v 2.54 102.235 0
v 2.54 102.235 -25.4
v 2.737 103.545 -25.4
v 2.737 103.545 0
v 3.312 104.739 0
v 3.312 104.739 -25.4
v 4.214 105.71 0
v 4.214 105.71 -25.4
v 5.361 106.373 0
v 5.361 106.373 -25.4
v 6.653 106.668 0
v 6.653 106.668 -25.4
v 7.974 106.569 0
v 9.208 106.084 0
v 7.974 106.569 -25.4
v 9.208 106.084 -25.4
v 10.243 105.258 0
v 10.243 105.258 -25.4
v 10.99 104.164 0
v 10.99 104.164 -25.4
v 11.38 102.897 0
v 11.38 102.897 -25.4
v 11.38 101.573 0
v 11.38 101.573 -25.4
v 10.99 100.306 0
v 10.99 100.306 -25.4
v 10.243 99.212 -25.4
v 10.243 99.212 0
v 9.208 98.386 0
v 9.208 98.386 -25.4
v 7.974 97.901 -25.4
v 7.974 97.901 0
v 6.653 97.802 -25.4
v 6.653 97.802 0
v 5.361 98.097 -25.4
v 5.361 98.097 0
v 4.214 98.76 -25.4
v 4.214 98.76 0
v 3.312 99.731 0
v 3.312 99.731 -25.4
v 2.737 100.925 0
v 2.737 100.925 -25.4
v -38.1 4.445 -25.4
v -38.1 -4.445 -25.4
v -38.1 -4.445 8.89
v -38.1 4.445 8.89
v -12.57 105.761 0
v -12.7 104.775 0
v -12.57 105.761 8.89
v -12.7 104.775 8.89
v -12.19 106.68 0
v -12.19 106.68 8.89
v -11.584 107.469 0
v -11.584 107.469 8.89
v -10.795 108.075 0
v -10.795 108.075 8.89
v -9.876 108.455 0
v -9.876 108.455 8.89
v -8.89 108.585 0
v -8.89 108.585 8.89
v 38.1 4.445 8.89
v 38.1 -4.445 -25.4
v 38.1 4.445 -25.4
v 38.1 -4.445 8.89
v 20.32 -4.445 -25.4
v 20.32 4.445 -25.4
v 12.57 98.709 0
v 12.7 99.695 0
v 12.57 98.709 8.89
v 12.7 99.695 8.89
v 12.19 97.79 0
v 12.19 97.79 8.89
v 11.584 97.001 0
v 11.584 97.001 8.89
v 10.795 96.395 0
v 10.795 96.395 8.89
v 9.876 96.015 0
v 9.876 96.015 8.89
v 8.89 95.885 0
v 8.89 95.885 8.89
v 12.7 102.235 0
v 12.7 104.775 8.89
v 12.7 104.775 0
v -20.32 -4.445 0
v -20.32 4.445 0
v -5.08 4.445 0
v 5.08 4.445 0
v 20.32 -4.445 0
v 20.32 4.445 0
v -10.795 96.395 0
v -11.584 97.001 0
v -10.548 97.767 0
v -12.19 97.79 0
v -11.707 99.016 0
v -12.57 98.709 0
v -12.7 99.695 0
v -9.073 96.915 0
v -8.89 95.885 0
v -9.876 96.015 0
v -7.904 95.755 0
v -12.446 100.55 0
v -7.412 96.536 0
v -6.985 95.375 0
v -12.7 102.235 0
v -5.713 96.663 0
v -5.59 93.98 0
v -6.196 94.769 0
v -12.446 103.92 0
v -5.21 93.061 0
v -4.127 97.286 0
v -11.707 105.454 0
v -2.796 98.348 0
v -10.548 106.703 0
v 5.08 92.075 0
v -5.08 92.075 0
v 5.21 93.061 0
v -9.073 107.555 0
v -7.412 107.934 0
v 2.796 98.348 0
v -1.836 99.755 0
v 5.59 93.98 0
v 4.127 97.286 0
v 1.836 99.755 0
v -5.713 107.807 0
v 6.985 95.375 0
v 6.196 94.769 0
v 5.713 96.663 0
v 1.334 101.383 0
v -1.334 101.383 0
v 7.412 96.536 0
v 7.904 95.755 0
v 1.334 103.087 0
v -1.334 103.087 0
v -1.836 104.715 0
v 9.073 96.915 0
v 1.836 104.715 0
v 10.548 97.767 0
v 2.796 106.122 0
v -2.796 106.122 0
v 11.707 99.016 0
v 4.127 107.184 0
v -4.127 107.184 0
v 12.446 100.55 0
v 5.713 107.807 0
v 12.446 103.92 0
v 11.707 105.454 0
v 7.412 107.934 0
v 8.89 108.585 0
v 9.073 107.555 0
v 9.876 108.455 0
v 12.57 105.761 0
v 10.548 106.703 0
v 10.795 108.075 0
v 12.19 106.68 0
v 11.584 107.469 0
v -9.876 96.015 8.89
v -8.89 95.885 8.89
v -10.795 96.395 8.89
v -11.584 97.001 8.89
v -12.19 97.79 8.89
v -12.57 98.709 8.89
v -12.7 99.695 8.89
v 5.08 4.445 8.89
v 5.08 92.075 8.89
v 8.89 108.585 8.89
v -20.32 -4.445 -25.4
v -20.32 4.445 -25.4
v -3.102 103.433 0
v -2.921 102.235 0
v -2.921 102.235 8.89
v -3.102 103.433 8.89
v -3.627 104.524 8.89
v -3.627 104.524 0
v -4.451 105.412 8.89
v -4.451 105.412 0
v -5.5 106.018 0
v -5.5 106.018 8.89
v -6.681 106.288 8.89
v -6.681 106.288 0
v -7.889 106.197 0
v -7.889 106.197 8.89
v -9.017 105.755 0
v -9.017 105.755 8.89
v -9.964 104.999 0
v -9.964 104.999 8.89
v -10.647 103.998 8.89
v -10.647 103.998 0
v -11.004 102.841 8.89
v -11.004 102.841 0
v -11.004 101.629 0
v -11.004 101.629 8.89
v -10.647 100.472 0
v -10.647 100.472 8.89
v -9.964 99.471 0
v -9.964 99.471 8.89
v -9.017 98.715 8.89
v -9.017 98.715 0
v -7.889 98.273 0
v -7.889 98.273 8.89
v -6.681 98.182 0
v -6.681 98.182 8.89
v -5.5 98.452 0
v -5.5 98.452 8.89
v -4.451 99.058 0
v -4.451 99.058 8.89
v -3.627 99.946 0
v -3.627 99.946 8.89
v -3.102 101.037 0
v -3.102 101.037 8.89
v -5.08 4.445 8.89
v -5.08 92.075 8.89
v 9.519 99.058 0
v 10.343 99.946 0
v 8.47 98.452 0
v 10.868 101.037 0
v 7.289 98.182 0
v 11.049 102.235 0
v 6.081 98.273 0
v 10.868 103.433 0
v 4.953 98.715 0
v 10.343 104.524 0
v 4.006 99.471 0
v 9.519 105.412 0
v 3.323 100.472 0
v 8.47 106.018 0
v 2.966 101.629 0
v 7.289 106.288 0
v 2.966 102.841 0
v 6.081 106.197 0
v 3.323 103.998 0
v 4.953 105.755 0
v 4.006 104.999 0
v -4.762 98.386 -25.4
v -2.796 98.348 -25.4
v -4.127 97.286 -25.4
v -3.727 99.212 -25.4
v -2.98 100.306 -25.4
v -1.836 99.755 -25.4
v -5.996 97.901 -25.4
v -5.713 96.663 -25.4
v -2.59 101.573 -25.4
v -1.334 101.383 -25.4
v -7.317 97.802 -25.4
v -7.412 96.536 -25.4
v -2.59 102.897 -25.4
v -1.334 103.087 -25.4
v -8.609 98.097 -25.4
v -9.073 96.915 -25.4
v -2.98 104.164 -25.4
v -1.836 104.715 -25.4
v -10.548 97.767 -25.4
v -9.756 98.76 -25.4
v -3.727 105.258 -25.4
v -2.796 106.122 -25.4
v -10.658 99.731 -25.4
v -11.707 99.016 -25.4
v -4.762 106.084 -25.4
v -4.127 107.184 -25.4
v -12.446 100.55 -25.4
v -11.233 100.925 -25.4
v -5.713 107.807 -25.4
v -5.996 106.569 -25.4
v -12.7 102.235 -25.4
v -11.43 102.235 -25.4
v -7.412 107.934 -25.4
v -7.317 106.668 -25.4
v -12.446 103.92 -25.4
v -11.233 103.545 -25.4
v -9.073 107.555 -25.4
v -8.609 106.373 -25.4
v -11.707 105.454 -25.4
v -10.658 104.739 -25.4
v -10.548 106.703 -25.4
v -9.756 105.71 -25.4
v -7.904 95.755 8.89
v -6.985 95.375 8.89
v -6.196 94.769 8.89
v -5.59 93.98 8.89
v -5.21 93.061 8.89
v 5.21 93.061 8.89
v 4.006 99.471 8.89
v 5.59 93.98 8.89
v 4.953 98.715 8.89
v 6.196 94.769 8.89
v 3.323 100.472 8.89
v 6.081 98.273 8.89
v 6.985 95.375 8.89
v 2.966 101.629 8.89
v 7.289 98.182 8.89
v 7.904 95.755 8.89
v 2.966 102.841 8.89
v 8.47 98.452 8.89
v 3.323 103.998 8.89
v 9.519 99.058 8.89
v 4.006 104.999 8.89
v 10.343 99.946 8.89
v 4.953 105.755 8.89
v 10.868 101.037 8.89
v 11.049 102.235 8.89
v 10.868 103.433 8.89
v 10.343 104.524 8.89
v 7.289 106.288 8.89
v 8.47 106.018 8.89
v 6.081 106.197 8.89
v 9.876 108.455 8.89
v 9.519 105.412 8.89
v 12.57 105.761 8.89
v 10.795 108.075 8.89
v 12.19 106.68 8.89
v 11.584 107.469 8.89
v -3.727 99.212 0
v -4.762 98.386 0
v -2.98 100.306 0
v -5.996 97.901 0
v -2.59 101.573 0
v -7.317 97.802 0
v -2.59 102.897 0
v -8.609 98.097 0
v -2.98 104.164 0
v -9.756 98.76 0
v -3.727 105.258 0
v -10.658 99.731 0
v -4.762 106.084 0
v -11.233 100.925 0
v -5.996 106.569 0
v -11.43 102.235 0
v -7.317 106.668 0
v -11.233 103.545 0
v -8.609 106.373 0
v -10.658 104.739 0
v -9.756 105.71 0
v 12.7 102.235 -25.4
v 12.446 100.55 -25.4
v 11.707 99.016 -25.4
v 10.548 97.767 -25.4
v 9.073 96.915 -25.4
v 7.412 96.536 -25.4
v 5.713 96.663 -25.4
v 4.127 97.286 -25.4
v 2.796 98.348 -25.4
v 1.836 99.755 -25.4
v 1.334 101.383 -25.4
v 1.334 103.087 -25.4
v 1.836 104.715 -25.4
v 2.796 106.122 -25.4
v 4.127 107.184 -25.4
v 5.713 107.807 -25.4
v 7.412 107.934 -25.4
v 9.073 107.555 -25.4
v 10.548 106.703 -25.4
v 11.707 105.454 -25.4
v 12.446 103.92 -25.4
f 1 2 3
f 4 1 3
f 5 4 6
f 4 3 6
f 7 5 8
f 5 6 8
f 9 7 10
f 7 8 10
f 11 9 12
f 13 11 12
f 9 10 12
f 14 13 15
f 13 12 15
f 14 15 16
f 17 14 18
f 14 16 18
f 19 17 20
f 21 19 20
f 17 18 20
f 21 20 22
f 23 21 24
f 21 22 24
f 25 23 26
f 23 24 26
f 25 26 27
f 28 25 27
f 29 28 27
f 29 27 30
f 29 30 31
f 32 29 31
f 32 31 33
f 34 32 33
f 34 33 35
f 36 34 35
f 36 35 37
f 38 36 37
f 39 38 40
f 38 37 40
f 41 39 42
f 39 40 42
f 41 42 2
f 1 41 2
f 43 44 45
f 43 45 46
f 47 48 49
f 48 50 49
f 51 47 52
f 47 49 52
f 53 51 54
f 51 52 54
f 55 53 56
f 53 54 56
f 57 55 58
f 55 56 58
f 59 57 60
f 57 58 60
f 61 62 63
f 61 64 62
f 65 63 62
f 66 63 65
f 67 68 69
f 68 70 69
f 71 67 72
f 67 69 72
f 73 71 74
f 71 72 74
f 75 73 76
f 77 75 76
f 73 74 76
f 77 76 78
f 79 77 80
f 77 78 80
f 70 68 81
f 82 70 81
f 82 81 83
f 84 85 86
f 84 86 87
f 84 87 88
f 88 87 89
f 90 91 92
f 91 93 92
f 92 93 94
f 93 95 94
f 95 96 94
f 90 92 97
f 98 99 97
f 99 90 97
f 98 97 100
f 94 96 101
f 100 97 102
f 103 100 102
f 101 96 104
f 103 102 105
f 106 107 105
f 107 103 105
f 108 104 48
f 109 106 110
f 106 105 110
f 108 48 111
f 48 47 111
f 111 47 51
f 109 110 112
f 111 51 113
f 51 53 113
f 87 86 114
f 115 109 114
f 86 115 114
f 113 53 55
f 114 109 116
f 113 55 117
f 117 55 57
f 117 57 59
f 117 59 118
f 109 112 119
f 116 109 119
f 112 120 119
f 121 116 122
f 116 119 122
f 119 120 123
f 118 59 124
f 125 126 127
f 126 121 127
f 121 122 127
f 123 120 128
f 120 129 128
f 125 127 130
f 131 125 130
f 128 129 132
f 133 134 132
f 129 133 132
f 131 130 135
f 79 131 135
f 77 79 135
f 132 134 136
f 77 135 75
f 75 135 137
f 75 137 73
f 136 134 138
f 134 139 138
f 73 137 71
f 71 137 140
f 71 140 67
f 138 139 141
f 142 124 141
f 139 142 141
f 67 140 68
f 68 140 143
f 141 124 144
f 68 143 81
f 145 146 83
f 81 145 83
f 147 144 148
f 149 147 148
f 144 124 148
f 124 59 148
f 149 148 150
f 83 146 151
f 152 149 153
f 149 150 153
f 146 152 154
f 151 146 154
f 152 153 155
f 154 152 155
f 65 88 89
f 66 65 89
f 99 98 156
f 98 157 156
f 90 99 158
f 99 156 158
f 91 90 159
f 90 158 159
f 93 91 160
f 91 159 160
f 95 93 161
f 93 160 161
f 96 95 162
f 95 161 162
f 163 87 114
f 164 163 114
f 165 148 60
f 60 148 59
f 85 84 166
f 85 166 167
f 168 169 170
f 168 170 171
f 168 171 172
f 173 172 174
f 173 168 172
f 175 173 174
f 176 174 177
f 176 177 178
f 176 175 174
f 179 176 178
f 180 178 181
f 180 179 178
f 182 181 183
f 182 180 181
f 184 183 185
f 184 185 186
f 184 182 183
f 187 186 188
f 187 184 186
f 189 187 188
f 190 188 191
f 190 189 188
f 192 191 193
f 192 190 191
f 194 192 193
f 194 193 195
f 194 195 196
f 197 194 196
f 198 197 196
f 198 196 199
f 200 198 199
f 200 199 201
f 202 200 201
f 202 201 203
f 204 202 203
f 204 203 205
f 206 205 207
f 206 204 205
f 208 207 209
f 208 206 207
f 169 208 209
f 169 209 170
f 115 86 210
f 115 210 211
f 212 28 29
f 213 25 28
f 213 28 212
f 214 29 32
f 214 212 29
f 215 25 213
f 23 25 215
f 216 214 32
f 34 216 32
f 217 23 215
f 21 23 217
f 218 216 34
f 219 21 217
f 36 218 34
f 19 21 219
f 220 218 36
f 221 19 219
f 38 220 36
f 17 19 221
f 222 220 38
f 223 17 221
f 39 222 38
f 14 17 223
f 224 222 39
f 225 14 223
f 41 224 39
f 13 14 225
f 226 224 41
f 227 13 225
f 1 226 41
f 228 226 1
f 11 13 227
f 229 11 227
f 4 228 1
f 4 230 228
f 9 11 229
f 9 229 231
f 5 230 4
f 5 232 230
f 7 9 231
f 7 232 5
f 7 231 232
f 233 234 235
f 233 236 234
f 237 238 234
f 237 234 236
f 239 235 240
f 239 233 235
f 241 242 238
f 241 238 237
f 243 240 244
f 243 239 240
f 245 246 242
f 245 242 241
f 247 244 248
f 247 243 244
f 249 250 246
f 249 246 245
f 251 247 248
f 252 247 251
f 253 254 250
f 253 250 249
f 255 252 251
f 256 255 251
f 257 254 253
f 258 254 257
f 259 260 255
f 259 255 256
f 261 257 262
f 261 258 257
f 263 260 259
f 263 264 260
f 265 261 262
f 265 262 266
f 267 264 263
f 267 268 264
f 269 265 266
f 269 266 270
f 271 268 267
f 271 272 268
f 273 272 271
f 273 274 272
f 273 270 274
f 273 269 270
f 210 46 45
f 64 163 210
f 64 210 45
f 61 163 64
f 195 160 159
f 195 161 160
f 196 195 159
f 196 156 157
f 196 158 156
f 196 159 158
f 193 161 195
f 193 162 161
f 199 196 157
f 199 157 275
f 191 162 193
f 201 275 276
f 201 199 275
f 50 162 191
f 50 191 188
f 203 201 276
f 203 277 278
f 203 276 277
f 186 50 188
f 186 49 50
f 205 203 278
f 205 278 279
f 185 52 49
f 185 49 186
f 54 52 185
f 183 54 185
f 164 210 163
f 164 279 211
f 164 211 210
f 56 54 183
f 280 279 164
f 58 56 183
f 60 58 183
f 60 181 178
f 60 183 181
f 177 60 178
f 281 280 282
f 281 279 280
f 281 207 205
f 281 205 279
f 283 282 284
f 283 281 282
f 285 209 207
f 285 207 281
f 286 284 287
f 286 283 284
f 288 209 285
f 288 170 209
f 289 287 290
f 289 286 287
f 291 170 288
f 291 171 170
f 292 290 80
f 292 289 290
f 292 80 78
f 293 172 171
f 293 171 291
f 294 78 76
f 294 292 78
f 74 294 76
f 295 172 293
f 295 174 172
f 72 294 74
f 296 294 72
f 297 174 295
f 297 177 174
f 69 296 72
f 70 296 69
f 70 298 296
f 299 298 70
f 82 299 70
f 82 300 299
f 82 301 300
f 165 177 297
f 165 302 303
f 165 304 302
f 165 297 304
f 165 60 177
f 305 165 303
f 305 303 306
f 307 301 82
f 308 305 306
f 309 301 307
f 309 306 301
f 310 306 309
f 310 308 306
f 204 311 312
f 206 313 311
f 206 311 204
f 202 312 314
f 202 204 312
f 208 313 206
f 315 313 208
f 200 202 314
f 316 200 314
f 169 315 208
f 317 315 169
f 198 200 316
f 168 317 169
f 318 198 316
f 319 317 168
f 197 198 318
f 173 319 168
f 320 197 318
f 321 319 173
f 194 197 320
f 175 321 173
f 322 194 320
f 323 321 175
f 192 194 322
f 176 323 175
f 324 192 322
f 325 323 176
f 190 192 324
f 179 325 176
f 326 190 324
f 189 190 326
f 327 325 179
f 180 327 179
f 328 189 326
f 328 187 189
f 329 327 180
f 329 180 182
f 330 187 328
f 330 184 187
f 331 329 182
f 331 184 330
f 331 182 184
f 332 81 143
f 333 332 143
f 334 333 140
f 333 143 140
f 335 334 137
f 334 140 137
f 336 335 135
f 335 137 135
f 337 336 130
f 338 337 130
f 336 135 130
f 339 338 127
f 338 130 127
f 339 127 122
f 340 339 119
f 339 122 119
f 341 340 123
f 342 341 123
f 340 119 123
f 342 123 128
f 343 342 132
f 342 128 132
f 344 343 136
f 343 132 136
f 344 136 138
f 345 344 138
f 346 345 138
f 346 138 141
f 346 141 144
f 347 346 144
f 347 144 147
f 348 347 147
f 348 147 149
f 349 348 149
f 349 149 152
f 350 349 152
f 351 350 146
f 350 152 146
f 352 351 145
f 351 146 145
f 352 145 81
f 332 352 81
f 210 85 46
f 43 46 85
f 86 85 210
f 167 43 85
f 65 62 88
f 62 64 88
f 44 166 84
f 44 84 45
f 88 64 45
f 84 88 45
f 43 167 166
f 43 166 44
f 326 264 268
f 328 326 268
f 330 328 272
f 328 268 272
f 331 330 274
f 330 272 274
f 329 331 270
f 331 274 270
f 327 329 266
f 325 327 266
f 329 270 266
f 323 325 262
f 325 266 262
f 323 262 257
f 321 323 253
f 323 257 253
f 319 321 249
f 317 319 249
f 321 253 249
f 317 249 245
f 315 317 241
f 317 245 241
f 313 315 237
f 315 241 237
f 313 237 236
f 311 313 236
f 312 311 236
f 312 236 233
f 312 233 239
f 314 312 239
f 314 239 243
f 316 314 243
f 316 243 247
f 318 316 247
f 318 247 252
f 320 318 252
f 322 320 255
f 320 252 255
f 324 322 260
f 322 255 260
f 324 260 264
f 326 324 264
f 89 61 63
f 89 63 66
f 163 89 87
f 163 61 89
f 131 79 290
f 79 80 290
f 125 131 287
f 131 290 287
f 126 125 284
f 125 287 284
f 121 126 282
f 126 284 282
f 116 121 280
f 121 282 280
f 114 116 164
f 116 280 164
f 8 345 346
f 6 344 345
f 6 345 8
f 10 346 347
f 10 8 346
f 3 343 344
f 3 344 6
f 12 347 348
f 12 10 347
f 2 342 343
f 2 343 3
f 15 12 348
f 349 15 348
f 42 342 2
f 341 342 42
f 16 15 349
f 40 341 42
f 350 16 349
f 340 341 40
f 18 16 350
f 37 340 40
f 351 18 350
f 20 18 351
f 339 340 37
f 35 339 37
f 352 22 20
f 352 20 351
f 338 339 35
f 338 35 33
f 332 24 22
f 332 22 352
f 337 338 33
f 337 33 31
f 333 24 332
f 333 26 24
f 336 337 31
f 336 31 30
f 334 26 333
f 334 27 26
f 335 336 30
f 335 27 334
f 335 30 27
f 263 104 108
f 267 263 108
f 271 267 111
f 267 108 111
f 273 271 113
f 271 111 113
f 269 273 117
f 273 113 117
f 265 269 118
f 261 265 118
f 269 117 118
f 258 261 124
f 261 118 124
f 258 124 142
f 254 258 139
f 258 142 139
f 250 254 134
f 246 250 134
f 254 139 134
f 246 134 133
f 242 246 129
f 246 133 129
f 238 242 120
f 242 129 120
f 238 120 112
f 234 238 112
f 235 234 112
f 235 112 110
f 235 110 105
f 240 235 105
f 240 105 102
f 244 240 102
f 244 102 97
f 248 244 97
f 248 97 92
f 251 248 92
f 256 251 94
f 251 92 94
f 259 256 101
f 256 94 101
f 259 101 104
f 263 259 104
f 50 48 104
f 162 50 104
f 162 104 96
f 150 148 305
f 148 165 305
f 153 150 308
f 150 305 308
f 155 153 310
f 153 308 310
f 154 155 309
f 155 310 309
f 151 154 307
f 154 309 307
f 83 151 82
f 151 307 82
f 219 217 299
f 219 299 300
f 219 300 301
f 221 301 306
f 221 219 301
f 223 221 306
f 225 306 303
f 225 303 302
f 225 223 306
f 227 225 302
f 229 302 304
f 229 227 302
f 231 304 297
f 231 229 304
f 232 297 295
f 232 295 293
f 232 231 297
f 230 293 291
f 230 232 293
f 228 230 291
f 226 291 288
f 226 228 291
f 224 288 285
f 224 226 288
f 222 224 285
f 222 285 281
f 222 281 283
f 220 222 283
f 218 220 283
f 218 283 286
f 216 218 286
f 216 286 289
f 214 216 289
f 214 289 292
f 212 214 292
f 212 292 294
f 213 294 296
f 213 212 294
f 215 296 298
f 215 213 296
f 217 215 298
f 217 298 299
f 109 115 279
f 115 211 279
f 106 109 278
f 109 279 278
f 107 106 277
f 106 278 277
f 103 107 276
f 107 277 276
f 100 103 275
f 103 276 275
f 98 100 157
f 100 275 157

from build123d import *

# Parameters (mm, degrees)
SKETCH1_W           = 10.16
SKETCH1_H           = 91.44
SKETCH1_R           = 4.064
SKETCH1_W_2         = 76.2
SKETCH1_H_2         = 8.89
BOSS_EXTRUDE1_DEPTH = 8.89
SKETCH2_R           = 5.715
BOSS_EXTRUDE2_DEPTH = 25.4
SKETCH3_R           = 4.445
CUT_EXTRUDE1_DEPTH  = 25.4
FILLET1_R           = 3.81
SKETCH4_W           = 17.78
SKETCH4_H           = 8.89
BOSS_EXTRUDE3_DEPTH = 25.4


with BuildPart() as part:
    # Sketch1 → Boss-Extrude1 (new body)
    # profile 1 of 3: a face of its own
    with BuildSketch(Plane.XY):
        with Locations((0, 50.165)):
            Rectangle(SKETCH1_W, SKETCH1_H)
    # profile 2 of 3: a face of its own
    with BuildSketch(Plane.XY):
        Polygon((-12.7, 95.885), (-5.08, 95.885), (5.08, 95.885), (12.7, 95.885), (12.7, 108.585), (-12.7, 108.585), align=None)
        with Locations((-6.985, 102.235)):
            Circle(SKETCH1_R, mode=Mode.SUBTRACT)
        with Locations((6.985, 102.235)):
            Circle(SKETCH1_R, mode=Mode.SUBTRACT)
    # profile 3 of 3: a face of its own
    with BuildSketch(Plane.XY):
        Rectangle(SKETCH1_W_2, SKETCH1_H_2)
    extrude(amount=BOSS_EXTRUDE1_DEPTH)

    # Sketch2 → Boss-Extrude2 (add)
    with BuildSketch(Plane(origin=(0, 0, 0), x_dir=(-1, 0, 0), z_dir=(0, 0, -1))):
        with Locations((6.985, 102.235)):
            Circle(SKETCH2_R)
        with Locations(Location((-6.985, 102.235, 0), (0, 0, 180))):
            Circle(SKETCH2_R)
    extrude(amount=BOSS_EXTRUDE2_DEPTH)

    # Sketch3 → Cut-Extrude1 (cut)
    with BuildSketch(Plane(origin=(0, 0, -25.4), x_dir=(-1, 0, 0), z_dir=(0, 0, -1))):
        with Locations((6.985, 102.235)):
            Circle(SKETCH3_R)
        with Locations((-6.985, 102.235)):
            Circle(SKETCH3_R)
    extrude(amount=-CUT_EXTRUDE1_DEPTH, mode=Mode.SUBTRACT)

    # Fillet1
    fillet1_edges = [part.edges().sort_by_distance(p)[0] for p in [
        (-5.08, 95.885, 4.445),
        (-12.7, 95.885, 4.445),
        (5.08, 95.885, 4.445),
        (12.7, 95.885, 4.445),
        (12.7, 108.585, 4.445),
        (-12.7, 108.585, 4.445),
    ]]
    fillet(fillet1_edges, radius=FILLET1_R - 0.0001)  # a hair under: the kernel refuses the full size

    # Sketch4 → Boss-Extrude3 (add)
    with BuildSketch(Plane(origin=(0, 0, 0), x_dir=(-1, 0, 0), z_dir=(0, 0, -1))):
        with Locations((-29.21, 0)):
            Rectangle(SKETCH4_W, SKETCH4_H)
        with Locations((29.21, 0)):
            Rectangle(SKETCH4_W, SKETCH4_H)
    extrude(amount=BOSS_EXTRUDE3_DEPTH)


solid = part.part
